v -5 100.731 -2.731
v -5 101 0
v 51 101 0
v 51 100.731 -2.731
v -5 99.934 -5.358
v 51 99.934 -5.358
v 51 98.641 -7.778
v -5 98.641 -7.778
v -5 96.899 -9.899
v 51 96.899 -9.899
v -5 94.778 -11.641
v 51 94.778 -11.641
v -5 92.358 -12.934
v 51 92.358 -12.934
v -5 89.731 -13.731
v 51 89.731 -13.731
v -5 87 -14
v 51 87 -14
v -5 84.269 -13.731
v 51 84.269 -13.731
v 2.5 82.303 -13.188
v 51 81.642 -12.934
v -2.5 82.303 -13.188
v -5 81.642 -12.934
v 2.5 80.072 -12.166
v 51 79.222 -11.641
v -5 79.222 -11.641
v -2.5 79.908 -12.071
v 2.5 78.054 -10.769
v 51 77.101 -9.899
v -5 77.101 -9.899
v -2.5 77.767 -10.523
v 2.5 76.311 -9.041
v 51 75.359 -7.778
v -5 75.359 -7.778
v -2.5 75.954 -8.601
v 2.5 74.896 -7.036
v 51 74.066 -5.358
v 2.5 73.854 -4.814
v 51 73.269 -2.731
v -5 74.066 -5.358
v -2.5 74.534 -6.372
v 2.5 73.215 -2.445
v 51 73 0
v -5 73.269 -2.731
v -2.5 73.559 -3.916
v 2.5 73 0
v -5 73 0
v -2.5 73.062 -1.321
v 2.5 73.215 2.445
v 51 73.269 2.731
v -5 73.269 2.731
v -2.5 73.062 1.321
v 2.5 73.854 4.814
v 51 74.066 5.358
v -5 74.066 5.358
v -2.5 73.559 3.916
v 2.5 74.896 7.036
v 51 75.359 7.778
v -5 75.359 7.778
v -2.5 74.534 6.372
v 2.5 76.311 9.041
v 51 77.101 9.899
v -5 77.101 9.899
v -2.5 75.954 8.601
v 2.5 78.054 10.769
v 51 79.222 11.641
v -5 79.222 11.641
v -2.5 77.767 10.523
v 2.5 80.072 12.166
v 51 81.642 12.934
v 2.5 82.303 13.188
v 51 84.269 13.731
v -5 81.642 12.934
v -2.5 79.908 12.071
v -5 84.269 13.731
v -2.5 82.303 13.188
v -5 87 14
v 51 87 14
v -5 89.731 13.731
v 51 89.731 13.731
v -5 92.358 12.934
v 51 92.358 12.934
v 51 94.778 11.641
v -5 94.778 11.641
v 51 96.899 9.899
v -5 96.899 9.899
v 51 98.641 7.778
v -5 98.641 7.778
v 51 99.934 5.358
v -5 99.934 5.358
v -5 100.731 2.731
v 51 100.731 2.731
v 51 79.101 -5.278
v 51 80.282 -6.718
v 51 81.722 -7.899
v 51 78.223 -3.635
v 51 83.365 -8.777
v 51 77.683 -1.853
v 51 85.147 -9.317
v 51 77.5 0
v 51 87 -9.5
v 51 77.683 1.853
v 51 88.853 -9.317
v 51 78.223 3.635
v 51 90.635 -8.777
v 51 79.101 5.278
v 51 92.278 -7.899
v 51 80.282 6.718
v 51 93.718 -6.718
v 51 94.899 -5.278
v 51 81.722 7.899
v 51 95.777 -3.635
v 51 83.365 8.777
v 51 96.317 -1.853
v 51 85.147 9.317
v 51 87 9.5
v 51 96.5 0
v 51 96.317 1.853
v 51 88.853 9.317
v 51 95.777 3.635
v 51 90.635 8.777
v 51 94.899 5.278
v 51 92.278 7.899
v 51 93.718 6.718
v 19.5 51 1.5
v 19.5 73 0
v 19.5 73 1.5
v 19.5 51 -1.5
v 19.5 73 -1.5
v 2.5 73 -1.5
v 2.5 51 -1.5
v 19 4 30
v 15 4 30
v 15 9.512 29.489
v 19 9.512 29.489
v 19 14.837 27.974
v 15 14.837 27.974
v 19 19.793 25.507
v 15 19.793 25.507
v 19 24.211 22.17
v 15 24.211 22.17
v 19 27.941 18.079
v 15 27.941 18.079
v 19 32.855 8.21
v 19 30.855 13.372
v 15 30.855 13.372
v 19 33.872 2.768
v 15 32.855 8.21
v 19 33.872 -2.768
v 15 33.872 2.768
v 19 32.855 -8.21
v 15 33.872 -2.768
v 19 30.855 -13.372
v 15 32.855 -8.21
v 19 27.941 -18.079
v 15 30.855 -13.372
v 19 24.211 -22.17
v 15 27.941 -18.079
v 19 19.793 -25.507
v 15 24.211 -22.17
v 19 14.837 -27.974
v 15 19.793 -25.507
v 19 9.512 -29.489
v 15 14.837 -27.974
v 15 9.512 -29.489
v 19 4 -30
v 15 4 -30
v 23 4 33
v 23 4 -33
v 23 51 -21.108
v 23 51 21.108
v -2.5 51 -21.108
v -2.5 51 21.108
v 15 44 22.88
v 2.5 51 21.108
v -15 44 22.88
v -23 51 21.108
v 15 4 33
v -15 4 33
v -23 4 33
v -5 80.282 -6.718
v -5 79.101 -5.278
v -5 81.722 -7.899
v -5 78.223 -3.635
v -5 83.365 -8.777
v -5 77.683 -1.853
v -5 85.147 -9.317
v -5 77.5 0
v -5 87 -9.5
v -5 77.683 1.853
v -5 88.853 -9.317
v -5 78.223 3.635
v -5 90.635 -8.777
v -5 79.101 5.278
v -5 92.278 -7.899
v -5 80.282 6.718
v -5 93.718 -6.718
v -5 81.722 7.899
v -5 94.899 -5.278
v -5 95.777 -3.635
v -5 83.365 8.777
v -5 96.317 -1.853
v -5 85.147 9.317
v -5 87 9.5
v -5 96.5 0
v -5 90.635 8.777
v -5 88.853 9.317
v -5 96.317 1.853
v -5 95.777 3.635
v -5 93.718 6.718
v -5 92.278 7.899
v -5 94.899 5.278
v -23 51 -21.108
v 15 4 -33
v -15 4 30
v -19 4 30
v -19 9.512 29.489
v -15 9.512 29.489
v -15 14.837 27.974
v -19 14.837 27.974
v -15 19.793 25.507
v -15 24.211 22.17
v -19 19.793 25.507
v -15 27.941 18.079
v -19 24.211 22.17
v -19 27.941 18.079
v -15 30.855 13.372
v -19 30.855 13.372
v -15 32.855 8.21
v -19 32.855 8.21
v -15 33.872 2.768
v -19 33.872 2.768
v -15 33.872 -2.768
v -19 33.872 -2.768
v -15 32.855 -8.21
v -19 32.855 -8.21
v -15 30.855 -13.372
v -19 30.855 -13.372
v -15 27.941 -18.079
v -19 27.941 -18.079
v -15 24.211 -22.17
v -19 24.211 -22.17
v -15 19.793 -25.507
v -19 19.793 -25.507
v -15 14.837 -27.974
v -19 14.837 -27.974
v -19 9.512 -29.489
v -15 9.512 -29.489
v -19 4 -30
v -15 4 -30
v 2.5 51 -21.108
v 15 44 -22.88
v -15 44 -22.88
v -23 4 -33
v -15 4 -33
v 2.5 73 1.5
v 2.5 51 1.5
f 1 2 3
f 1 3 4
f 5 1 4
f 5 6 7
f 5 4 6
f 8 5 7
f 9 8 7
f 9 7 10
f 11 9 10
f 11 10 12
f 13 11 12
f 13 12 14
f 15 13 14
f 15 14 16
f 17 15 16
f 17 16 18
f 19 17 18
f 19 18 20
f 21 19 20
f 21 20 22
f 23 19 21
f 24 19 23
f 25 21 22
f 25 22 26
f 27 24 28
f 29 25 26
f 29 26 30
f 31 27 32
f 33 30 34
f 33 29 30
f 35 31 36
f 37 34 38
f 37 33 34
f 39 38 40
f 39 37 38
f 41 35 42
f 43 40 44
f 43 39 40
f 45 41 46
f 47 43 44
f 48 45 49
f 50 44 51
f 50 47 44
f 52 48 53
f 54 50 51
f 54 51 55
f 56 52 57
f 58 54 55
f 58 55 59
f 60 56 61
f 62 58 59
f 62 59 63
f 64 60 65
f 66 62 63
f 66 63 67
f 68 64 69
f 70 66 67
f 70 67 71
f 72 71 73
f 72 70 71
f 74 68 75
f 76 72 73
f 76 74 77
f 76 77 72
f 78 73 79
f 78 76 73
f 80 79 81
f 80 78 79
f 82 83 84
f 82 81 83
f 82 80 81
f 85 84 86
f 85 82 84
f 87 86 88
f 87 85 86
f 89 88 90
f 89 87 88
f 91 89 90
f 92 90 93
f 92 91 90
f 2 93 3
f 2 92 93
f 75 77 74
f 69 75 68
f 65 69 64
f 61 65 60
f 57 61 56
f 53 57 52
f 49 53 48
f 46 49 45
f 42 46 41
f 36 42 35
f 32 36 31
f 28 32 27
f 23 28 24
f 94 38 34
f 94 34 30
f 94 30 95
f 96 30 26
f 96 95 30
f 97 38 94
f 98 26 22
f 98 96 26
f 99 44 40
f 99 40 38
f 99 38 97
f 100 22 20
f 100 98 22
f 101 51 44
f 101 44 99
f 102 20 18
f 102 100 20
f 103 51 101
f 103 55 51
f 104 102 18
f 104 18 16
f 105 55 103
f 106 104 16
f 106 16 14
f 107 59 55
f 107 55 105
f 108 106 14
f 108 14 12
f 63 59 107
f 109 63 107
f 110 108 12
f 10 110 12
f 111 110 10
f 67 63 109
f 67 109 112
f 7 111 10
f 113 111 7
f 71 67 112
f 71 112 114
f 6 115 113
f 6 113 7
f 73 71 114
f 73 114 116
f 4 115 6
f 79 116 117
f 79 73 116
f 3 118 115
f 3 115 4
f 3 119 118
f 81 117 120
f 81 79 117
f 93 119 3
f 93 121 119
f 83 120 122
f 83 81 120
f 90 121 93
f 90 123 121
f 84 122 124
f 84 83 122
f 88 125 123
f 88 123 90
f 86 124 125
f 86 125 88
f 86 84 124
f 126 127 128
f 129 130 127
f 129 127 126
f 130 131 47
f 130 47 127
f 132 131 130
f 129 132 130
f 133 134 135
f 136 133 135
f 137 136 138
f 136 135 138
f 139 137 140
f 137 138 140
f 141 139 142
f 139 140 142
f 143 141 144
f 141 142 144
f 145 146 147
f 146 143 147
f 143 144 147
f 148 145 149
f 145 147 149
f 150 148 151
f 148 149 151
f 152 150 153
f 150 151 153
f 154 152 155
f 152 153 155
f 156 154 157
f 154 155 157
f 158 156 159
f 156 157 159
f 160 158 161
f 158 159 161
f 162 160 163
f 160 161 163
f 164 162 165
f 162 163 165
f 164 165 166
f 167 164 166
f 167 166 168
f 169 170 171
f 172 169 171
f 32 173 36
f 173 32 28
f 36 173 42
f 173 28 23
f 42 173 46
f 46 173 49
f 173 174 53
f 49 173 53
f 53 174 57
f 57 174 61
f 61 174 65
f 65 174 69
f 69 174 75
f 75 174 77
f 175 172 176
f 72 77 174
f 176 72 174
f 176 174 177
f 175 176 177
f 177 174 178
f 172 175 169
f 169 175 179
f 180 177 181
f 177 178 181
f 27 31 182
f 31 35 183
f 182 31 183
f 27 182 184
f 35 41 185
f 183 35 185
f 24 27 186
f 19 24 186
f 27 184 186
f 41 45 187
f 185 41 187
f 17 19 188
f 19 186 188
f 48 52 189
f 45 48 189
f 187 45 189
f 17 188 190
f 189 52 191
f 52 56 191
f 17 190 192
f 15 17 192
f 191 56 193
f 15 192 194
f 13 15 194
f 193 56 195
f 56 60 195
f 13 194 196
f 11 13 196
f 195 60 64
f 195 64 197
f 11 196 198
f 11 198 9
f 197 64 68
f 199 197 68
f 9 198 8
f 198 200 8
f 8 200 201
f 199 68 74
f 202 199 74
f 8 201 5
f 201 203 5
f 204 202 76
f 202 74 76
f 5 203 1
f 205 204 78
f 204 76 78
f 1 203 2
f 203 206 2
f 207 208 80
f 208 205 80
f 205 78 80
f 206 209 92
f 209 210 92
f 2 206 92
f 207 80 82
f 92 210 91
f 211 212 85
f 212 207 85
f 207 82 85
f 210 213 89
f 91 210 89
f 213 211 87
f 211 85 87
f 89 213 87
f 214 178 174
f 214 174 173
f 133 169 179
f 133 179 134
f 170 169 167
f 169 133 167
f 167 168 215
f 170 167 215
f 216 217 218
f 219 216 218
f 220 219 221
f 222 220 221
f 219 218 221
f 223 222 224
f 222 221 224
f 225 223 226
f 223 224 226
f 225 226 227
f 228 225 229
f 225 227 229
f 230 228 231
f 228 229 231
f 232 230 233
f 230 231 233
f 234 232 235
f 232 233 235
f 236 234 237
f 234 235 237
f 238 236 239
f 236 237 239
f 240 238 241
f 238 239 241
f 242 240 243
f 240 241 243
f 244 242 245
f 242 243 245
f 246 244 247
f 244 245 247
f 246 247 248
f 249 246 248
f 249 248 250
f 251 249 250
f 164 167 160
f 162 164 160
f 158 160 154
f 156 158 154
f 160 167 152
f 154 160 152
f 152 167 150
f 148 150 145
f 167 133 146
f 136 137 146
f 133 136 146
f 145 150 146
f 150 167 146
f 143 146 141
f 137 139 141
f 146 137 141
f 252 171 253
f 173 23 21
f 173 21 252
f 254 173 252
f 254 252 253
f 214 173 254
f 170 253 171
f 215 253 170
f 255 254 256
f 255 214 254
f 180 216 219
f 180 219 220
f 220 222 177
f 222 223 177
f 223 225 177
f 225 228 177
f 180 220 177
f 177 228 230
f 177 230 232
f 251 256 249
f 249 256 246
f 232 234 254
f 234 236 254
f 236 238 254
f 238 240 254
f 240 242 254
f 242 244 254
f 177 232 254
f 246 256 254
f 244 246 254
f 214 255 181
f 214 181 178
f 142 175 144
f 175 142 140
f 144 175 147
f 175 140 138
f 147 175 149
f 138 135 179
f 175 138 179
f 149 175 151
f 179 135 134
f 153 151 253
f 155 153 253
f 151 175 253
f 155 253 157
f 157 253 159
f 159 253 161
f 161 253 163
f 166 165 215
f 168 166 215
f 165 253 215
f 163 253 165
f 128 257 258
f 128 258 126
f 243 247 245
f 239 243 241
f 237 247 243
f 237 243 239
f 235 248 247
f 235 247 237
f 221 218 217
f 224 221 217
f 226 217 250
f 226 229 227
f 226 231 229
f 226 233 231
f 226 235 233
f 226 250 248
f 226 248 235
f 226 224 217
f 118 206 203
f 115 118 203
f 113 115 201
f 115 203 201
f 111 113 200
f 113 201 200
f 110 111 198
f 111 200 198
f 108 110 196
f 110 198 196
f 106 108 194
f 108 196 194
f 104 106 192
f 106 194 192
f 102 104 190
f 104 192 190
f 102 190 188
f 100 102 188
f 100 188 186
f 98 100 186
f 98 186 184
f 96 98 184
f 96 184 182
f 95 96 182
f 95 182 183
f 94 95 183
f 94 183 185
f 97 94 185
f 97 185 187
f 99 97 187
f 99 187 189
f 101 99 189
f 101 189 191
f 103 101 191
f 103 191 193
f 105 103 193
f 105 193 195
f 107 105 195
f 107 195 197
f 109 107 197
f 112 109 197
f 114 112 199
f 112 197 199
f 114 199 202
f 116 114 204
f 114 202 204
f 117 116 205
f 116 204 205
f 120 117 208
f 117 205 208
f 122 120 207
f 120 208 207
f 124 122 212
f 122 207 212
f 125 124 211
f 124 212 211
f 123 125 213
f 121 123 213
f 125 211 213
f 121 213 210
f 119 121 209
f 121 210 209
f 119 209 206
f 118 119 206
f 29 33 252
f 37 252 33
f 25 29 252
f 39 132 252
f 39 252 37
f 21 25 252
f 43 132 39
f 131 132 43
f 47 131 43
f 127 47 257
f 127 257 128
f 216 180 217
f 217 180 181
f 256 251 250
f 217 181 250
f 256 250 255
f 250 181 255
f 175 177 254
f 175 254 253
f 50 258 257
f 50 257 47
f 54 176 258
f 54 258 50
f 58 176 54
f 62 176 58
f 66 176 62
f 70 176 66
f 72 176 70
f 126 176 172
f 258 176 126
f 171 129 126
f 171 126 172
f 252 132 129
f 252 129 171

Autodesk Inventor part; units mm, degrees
ref_plane "YZ Plane" through (0, 0, 0) normal (1, 0, 0) x (0, 1, 0)
ref_plane "XZ Plane" through (0, 0, 0) normal (0, 1, 0) x (-1, 0, 0)
ref_plane "XY Plane" through (0, 0, 0) normal (0, 0, 1) x (1, 0, 0)
sketch "Sketch1" plane through (0, 0, 0) normal (1, 0, 0) x (0, 1, 0)
  line L0 (0, 33) -> (0, -33)
  line L1 (47.2724, 0) -> (-31.6075, 0)
  line L2 (0, 33) -> (4, 33)
  line L3 (4, 33) -> (4, -33)
  line L4 (4, -33) -> (0, -33)
  line L5 (87, 12) -> (87, -12)
  line L6 (87, 12) -> (4, 33)
  line L7 (87, -12) -> (4, -33)
  line L8 (51, 21.1084) -> (51, -21.1084)
  circle A0 centre (4, 0) radius 24 construction
  circle A1 centre (4, 0) radius 30 construction
  arc A2 (4, -24) -> (4, 24) centre (4, 0) ccw
  arc A3 (4, -30) -> (4, 30) centre (4, 0) ccw
  point P0 (0, 0)
  dimension "d9" = 48
  dimension "d0" = 66
  dimension "d1" = 4
  dimension "d2" = 24
  dimension "d3" = 87
  dimension "d4" = 36
  dimension "d10" = 60
extrude "Extrusion1" add sketch "Sketch1" along normal mid plane 46 contours L6 L8 L7 L3 A3 | L3 A2 L1 | L1 A2 L3 | A3 L1 A2 L3 | L1 A3 L3 A2
extrude "Extrusion2" add sketch "Sketch1" along normal mid plane 5 contours L6 L5 L7 L8
sketch "Sketch2" plane through (0, 0, 0) normal (0, 0, 1) x (1, 0, 0)
  line L0 (-2.5, 87) -> (2.5, 87) projected
  line L1 (0, 87) -> (0, 0)
  line L2 (-15, 44) -> (15, 44)
  line L3 (15, 44) -> (15, 4)
  line L4 (15, 4) -> (-15, 4)
  line L5 (-15, 4) -> (-15, 44)
  line L6 (-23, 4) -> (23, 4) projected
  dimension "d13" = 30
  dimension "d14" = 40
extrude "Extrusion4" cut sketch "Sketch2" along normal mid plane 66
sketch "Sketch3" plane through (0, 0, 0) normal (1, 0, 0) x (0, 1, 0)
  line L0 (87, -12) -> (87, 12) projected
  circle A0 centre (87, 0) radius 9.5
  circle A1 centre (87, 0) radius 14
  point P0 (0, 0)
  dimension "d17" = 19
  dimension "d18" = 28
extrude "Extrusion5" add sketch "Sketch3" along normal blind 51 and the other way blind 5
sketch "Sketch4" plane through (0, 0, 0) normal (1, 0, 0) x (0, 1, 0)
  line L0 (87, 9.5) -> (87, -9.5) projected
  circle A0 centre (87, 0) radius 9.5
  point P0 (0, 0)
extrude "Extrusion6" cut sketch "Sketch4" along normal blind 51 and the other way blind 5 contours L0 A0 picked at (82.8782, 1.7989)
extrude "Extrusion7" cut sketch "Sketch1" along normal mid plane 38 contours L3 A2 L1 | L1 A2 L3 | A3 L1 A2 L3 | L1 A3 L3 A2
sketch "Sketch5" plane through (0, 0, 0) normal (0, 0, 1) x (1, 0, 0)
  line L0 (2.5, 73) -> (19.5, 73)
  line L1 (19.5, 73) -> (19.5, 51)
  line L2 (19.5, 51) -> (2.5, 51)
  line L3 (2.5, 51) -> (2.5, 73)
  line L4 (23, 51) -> (2.5, 51) construction
  line L5 (2.5, 51) -> (0, 51) construction
  line L6 (0, 87.0731) -> (77.1013, 87.0731) construction
  line L7 (0, 87.0731) -> (36, 87.0731)
  point P0 (0, 0)
  dimension "d29" = 22
  dimension "d30" = 17
  dimension "d31" = 36
extrude "Extrusion8" add sketch "Sketch5" along normal mid plane 3
sketch "Sketch6" plane through (19.5, 51, 1.5) normal (1, 0, 0) x (0, 0, -1)
  point P0 (1.5, -51)
sketch "Sketch7" plane through (-5, 87, 0) normal (-1, 0, 0) x (0, 0, 1)
  point P0 (0, -87)
sketch "Sketch8" plane through (0, 0, 0) normal (0, 0, 1) x (1, 0, 0)
  line L0 (-5, 101) -> (-5, 73) construction
  line L1 (-5, 87) -> (51, 87)
  line L2 (51, 73) -> (51, 101) construction
  point P0 (0, 0)
sketch "Sketch9" plane through (23, 0, 0) normal (1, 0, 0) x (0, 0, -1)
  point P0 (0, 0)
sketch "Sketch10" plane through (51, 87, 0) normal (1, 0, 0) x (0, 0, -1)
  circle A0 centre (0, 0) radius 14 projected
  line L0 (-14, 0) -> (14, 0) construction
  point P0 (0, -87)
sketch "Sketch11" plane through (-5, 87, 0) normal (-1, 0, 0) x (0, 0, 1)
  circle A0 centre (0, 0) radius 14 projected
  line L0 (-14, 0) -> (14, 0) construction
  point P0 (0, -87)
properties part number "Bai_16"
